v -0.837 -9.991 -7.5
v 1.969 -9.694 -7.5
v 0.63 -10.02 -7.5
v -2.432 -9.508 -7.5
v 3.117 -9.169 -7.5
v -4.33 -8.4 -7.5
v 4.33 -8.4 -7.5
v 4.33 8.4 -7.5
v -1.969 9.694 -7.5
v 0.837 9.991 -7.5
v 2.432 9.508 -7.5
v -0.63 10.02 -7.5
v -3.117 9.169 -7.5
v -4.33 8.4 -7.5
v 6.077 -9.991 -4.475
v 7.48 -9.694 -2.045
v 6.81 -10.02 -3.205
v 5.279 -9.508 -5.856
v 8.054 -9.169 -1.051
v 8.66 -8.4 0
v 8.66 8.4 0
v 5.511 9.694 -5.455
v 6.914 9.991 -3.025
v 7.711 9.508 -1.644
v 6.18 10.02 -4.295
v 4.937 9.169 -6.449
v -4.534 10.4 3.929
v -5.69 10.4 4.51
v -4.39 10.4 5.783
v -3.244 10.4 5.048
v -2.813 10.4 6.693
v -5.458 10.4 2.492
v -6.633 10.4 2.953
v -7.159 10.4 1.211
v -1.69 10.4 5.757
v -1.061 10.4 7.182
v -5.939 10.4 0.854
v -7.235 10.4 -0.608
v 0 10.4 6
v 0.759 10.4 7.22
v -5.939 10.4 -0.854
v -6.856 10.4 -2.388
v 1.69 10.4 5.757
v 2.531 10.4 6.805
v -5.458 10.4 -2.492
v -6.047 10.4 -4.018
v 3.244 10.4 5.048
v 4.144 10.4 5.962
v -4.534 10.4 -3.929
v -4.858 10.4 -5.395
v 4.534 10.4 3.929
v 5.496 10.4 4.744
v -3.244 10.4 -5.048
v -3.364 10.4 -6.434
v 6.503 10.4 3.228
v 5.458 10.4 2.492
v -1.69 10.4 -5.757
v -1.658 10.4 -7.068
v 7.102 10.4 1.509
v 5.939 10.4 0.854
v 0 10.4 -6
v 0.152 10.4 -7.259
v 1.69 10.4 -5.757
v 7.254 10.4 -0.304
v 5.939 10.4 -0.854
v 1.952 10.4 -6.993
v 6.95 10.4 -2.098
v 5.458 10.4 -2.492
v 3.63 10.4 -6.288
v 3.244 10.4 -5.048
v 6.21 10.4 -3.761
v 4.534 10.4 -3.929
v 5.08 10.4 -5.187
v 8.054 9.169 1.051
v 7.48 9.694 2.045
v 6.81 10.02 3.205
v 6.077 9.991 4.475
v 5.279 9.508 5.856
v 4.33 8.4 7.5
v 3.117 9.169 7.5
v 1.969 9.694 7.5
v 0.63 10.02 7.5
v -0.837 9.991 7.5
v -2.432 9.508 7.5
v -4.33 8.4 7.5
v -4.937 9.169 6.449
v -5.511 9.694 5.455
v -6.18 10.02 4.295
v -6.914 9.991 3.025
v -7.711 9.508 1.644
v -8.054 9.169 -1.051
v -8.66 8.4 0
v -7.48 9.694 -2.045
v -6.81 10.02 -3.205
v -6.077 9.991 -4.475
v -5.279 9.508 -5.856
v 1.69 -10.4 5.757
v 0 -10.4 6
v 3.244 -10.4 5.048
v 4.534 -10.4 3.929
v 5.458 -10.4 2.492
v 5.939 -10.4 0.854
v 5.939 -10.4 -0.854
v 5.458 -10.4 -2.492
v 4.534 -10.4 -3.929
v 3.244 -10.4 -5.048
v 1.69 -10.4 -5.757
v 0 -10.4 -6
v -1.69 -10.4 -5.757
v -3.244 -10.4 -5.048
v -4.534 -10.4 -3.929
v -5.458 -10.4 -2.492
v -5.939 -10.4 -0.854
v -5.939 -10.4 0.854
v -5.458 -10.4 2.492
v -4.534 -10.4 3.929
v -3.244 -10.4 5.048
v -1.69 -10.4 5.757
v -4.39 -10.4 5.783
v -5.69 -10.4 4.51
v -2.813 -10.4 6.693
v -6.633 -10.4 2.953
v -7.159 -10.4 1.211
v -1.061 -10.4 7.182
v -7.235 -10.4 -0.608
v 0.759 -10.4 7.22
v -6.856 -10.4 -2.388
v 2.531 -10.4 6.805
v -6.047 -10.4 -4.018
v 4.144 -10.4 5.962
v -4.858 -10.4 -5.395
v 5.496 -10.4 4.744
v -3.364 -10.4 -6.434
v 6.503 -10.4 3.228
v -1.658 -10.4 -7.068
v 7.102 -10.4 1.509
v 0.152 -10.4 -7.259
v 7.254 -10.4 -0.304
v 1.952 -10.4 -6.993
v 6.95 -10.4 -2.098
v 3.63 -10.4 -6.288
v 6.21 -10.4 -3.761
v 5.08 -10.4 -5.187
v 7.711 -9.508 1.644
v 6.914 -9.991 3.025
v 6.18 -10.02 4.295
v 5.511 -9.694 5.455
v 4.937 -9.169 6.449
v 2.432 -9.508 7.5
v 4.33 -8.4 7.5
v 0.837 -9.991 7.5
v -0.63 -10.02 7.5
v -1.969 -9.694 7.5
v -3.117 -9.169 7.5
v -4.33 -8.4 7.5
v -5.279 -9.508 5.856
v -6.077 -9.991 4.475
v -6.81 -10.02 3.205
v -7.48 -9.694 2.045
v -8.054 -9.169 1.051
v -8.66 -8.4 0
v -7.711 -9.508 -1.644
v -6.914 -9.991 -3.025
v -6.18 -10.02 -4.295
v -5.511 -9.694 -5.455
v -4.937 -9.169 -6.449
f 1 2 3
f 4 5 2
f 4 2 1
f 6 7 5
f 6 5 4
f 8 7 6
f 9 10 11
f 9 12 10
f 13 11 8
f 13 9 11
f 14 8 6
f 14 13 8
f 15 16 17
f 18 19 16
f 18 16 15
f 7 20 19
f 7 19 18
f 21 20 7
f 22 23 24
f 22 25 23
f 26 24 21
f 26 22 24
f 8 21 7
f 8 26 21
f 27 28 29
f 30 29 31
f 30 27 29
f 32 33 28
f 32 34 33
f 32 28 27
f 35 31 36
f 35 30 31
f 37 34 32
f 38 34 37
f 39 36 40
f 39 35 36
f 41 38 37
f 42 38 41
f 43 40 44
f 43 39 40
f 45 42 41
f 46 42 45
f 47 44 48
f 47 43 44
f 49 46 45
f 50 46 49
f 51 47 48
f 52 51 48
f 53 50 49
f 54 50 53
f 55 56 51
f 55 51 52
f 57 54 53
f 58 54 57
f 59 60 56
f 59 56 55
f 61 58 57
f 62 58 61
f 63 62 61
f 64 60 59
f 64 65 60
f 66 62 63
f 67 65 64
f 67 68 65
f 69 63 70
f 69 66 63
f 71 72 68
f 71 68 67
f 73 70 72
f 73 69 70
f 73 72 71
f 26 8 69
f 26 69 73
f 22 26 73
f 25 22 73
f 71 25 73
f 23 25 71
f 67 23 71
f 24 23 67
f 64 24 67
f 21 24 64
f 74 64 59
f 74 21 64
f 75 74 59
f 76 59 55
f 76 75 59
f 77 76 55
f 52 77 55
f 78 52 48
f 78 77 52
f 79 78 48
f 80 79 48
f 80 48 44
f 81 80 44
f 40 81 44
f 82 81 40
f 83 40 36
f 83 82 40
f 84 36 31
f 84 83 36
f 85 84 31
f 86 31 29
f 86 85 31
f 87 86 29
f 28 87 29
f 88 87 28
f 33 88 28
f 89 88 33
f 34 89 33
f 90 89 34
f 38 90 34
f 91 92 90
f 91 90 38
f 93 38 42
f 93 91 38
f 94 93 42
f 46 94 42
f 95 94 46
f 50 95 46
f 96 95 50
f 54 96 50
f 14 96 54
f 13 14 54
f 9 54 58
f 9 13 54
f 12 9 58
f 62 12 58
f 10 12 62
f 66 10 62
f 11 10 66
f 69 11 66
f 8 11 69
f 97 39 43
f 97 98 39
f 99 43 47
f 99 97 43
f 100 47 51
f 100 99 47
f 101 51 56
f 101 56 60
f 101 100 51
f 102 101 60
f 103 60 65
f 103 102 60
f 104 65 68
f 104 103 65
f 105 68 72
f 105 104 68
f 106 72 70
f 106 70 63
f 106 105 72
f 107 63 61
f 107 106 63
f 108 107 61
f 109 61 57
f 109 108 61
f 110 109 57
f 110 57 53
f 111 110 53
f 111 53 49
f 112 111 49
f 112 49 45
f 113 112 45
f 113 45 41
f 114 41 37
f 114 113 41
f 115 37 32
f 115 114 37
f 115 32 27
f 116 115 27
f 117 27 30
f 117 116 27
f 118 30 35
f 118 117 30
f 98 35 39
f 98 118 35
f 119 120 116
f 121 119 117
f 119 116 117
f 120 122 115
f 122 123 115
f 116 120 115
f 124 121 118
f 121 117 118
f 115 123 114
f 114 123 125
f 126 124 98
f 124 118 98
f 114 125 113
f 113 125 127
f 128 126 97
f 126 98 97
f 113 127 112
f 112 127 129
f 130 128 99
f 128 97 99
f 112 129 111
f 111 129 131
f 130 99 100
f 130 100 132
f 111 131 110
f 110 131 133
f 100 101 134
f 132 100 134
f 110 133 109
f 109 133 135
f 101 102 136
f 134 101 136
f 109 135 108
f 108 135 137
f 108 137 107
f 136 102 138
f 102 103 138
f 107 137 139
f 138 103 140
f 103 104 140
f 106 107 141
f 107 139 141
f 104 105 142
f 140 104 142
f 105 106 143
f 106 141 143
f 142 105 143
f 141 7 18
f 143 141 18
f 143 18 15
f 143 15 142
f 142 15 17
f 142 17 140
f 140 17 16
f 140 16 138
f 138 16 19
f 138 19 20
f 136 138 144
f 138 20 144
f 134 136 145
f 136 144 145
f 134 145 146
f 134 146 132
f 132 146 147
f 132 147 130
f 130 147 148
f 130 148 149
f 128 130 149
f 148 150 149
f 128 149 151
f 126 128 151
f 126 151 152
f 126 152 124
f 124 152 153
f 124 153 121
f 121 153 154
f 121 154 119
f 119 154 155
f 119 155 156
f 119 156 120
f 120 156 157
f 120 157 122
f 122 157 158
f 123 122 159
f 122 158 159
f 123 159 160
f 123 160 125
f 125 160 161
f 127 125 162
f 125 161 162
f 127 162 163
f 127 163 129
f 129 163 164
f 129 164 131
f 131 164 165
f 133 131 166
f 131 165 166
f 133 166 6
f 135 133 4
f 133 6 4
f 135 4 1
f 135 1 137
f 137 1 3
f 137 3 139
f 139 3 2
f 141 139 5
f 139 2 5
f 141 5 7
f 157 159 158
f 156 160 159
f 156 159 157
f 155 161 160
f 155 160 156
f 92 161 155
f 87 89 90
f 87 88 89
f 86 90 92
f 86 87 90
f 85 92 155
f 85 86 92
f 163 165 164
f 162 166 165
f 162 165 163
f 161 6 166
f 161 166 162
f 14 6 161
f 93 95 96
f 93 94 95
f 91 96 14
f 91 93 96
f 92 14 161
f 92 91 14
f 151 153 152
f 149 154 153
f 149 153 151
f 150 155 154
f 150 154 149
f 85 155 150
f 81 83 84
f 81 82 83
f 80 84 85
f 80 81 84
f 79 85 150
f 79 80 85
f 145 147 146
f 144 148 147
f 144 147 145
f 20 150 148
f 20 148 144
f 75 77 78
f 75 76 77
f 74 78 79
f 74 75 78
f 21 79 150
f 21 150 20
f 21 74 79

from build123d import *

# Parameters (mm, degrees)
SKETCH_1_R      = 6
EXTRUDE_1_DEPTH = 10.4


with BuildPart() as part:
    # 草图1 → 凸台-拉伸1 (new, symmetric)
    with BuildSketch(Plane(origin=(0, 0, 0), x_dir=(1, 0, 0), z_dir=(0, 1, 0))):
        Polygon((4.330127019, 7.5), (-4.330127019, 7.5), (-8.660254038, 0), (-4.330127019, -7.5), (4.330127019, -7.5), (8.660254038, 0), align=None)
        with Locations(Location((0, 0, 0), (0, 0, 270))):
            Circle(SKETCH_1_R, mode=Mode.SUBTRACT)
    extrude(amount=EXTRUDE_1_DEPTH, both=True)

    # 草图3 → 切除-旋转1 (revolve, cut)
    with BuildSketch(Plane.XY, mode=Mode.PRIVATE) as cut_revolve_1_sk:
        Polygon((7.260254038, 10.4), (8.660254038, 8.4), (8.660254038, 10.4), align=None)
        Polygon((8.660254038, -10.4), (7.260254038, -10.4), (8.660254038, -8.4), align=None)
    revolve(cut_revolve_1_sk.sketch.rotate(Axis((0, 21.443940686, 0), (0, -1, 0)), 300.000000037), axis=Axis((0, 21.443940686, 0), (0, -1, 0)), mode=Mode.SUBTRACT)


solid = part.part
